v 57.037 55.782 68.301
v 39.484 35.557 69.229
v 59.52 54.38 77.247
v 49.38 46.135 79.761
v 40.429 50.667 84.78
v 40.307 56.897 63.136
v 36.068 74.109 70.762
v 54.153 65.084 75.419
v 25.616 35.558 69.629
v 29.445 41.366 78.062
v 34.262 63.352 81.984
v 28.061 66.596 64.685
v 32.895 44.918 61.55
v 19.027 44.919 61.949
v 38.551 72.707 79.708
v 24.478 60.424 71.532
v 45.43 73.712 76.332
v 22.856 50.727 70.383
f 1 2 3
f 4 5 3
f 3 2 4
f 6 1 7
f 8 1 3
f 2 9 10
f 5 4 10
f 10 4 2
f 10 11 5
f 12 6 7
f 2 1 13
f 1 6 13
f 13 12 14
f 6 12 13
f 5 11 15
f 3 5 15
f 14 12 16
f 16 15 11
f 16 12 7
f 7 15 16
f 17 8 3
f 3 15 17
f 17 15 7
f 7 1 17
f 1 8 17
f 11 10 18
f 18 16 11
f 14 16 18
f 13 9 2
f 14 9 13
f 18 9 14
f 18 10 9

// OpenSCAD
// Auto-generated auxetic polyhedron
points = [
    [59.520340, 54.379946, 77.246716],
    [39.483927, 35.556846, 69.229080],
    [57.036552, 55.781515, 68.301245],
    [40.429495, 50.666800, 84.779780],
    [49.379717, 46.134878, 79.760830],
    [36.067680, 74.108563, 70.762423],
    [40.306887, 56.897419, 63.136197],
    [54.153159, 65.083721, 75.418813],
    [29.445114, 41.366173, 78.061712],
    [25.616153, 35.558425, 69.628580],
    [34.262197, 63.351503, 81.984275],
    [28.061367, 66.596320, 64.684680],
    [32.894885, 44.917818, 61.549918],
    [19.027110, 44.919397, 61.949418],
    [38.551468, 72.706994, 79.707894],
    [24.478326, 60.424467, 71.531533],
    [45.429807, 73.711867, 76.331509],
    [22.856071, 50.727144, 70.382550],
];

faces = [
    [0, 1, 2],
    [0, 3, 4],
    [4, 1, 0],
    [5, 2, 6],
    [0, 2, 7],
    [8, 9, 1],
    [8, 4, 3],
    [1, 4, 8],
    [3, 10, 8],
    [5, 6, 11],
    [12, 2, 1],
    [12, 6, 2],
    [13, 11, 12],
    [12, 11, 6],
    [14, 10, 3],
    [14, 3, 0],
    [15, 11, 13],
    [10, 14, 15],
    [5, 11, 15],
    [15, 14, 5],
    [0, 7, 16],
    [16, 14, 0],
    [5, 14, 16],
    [16, 2, 5],
    [16, 7, 2],
    [17, 8, 10],
    [10, 15, 17],
    [17, 15, 13],
    [1, 9, 12],
    [12, 9, 13],
    [13, 9, 17],
    [9, 8, 17],
];

polyhedron(points = points, faces = faces);
